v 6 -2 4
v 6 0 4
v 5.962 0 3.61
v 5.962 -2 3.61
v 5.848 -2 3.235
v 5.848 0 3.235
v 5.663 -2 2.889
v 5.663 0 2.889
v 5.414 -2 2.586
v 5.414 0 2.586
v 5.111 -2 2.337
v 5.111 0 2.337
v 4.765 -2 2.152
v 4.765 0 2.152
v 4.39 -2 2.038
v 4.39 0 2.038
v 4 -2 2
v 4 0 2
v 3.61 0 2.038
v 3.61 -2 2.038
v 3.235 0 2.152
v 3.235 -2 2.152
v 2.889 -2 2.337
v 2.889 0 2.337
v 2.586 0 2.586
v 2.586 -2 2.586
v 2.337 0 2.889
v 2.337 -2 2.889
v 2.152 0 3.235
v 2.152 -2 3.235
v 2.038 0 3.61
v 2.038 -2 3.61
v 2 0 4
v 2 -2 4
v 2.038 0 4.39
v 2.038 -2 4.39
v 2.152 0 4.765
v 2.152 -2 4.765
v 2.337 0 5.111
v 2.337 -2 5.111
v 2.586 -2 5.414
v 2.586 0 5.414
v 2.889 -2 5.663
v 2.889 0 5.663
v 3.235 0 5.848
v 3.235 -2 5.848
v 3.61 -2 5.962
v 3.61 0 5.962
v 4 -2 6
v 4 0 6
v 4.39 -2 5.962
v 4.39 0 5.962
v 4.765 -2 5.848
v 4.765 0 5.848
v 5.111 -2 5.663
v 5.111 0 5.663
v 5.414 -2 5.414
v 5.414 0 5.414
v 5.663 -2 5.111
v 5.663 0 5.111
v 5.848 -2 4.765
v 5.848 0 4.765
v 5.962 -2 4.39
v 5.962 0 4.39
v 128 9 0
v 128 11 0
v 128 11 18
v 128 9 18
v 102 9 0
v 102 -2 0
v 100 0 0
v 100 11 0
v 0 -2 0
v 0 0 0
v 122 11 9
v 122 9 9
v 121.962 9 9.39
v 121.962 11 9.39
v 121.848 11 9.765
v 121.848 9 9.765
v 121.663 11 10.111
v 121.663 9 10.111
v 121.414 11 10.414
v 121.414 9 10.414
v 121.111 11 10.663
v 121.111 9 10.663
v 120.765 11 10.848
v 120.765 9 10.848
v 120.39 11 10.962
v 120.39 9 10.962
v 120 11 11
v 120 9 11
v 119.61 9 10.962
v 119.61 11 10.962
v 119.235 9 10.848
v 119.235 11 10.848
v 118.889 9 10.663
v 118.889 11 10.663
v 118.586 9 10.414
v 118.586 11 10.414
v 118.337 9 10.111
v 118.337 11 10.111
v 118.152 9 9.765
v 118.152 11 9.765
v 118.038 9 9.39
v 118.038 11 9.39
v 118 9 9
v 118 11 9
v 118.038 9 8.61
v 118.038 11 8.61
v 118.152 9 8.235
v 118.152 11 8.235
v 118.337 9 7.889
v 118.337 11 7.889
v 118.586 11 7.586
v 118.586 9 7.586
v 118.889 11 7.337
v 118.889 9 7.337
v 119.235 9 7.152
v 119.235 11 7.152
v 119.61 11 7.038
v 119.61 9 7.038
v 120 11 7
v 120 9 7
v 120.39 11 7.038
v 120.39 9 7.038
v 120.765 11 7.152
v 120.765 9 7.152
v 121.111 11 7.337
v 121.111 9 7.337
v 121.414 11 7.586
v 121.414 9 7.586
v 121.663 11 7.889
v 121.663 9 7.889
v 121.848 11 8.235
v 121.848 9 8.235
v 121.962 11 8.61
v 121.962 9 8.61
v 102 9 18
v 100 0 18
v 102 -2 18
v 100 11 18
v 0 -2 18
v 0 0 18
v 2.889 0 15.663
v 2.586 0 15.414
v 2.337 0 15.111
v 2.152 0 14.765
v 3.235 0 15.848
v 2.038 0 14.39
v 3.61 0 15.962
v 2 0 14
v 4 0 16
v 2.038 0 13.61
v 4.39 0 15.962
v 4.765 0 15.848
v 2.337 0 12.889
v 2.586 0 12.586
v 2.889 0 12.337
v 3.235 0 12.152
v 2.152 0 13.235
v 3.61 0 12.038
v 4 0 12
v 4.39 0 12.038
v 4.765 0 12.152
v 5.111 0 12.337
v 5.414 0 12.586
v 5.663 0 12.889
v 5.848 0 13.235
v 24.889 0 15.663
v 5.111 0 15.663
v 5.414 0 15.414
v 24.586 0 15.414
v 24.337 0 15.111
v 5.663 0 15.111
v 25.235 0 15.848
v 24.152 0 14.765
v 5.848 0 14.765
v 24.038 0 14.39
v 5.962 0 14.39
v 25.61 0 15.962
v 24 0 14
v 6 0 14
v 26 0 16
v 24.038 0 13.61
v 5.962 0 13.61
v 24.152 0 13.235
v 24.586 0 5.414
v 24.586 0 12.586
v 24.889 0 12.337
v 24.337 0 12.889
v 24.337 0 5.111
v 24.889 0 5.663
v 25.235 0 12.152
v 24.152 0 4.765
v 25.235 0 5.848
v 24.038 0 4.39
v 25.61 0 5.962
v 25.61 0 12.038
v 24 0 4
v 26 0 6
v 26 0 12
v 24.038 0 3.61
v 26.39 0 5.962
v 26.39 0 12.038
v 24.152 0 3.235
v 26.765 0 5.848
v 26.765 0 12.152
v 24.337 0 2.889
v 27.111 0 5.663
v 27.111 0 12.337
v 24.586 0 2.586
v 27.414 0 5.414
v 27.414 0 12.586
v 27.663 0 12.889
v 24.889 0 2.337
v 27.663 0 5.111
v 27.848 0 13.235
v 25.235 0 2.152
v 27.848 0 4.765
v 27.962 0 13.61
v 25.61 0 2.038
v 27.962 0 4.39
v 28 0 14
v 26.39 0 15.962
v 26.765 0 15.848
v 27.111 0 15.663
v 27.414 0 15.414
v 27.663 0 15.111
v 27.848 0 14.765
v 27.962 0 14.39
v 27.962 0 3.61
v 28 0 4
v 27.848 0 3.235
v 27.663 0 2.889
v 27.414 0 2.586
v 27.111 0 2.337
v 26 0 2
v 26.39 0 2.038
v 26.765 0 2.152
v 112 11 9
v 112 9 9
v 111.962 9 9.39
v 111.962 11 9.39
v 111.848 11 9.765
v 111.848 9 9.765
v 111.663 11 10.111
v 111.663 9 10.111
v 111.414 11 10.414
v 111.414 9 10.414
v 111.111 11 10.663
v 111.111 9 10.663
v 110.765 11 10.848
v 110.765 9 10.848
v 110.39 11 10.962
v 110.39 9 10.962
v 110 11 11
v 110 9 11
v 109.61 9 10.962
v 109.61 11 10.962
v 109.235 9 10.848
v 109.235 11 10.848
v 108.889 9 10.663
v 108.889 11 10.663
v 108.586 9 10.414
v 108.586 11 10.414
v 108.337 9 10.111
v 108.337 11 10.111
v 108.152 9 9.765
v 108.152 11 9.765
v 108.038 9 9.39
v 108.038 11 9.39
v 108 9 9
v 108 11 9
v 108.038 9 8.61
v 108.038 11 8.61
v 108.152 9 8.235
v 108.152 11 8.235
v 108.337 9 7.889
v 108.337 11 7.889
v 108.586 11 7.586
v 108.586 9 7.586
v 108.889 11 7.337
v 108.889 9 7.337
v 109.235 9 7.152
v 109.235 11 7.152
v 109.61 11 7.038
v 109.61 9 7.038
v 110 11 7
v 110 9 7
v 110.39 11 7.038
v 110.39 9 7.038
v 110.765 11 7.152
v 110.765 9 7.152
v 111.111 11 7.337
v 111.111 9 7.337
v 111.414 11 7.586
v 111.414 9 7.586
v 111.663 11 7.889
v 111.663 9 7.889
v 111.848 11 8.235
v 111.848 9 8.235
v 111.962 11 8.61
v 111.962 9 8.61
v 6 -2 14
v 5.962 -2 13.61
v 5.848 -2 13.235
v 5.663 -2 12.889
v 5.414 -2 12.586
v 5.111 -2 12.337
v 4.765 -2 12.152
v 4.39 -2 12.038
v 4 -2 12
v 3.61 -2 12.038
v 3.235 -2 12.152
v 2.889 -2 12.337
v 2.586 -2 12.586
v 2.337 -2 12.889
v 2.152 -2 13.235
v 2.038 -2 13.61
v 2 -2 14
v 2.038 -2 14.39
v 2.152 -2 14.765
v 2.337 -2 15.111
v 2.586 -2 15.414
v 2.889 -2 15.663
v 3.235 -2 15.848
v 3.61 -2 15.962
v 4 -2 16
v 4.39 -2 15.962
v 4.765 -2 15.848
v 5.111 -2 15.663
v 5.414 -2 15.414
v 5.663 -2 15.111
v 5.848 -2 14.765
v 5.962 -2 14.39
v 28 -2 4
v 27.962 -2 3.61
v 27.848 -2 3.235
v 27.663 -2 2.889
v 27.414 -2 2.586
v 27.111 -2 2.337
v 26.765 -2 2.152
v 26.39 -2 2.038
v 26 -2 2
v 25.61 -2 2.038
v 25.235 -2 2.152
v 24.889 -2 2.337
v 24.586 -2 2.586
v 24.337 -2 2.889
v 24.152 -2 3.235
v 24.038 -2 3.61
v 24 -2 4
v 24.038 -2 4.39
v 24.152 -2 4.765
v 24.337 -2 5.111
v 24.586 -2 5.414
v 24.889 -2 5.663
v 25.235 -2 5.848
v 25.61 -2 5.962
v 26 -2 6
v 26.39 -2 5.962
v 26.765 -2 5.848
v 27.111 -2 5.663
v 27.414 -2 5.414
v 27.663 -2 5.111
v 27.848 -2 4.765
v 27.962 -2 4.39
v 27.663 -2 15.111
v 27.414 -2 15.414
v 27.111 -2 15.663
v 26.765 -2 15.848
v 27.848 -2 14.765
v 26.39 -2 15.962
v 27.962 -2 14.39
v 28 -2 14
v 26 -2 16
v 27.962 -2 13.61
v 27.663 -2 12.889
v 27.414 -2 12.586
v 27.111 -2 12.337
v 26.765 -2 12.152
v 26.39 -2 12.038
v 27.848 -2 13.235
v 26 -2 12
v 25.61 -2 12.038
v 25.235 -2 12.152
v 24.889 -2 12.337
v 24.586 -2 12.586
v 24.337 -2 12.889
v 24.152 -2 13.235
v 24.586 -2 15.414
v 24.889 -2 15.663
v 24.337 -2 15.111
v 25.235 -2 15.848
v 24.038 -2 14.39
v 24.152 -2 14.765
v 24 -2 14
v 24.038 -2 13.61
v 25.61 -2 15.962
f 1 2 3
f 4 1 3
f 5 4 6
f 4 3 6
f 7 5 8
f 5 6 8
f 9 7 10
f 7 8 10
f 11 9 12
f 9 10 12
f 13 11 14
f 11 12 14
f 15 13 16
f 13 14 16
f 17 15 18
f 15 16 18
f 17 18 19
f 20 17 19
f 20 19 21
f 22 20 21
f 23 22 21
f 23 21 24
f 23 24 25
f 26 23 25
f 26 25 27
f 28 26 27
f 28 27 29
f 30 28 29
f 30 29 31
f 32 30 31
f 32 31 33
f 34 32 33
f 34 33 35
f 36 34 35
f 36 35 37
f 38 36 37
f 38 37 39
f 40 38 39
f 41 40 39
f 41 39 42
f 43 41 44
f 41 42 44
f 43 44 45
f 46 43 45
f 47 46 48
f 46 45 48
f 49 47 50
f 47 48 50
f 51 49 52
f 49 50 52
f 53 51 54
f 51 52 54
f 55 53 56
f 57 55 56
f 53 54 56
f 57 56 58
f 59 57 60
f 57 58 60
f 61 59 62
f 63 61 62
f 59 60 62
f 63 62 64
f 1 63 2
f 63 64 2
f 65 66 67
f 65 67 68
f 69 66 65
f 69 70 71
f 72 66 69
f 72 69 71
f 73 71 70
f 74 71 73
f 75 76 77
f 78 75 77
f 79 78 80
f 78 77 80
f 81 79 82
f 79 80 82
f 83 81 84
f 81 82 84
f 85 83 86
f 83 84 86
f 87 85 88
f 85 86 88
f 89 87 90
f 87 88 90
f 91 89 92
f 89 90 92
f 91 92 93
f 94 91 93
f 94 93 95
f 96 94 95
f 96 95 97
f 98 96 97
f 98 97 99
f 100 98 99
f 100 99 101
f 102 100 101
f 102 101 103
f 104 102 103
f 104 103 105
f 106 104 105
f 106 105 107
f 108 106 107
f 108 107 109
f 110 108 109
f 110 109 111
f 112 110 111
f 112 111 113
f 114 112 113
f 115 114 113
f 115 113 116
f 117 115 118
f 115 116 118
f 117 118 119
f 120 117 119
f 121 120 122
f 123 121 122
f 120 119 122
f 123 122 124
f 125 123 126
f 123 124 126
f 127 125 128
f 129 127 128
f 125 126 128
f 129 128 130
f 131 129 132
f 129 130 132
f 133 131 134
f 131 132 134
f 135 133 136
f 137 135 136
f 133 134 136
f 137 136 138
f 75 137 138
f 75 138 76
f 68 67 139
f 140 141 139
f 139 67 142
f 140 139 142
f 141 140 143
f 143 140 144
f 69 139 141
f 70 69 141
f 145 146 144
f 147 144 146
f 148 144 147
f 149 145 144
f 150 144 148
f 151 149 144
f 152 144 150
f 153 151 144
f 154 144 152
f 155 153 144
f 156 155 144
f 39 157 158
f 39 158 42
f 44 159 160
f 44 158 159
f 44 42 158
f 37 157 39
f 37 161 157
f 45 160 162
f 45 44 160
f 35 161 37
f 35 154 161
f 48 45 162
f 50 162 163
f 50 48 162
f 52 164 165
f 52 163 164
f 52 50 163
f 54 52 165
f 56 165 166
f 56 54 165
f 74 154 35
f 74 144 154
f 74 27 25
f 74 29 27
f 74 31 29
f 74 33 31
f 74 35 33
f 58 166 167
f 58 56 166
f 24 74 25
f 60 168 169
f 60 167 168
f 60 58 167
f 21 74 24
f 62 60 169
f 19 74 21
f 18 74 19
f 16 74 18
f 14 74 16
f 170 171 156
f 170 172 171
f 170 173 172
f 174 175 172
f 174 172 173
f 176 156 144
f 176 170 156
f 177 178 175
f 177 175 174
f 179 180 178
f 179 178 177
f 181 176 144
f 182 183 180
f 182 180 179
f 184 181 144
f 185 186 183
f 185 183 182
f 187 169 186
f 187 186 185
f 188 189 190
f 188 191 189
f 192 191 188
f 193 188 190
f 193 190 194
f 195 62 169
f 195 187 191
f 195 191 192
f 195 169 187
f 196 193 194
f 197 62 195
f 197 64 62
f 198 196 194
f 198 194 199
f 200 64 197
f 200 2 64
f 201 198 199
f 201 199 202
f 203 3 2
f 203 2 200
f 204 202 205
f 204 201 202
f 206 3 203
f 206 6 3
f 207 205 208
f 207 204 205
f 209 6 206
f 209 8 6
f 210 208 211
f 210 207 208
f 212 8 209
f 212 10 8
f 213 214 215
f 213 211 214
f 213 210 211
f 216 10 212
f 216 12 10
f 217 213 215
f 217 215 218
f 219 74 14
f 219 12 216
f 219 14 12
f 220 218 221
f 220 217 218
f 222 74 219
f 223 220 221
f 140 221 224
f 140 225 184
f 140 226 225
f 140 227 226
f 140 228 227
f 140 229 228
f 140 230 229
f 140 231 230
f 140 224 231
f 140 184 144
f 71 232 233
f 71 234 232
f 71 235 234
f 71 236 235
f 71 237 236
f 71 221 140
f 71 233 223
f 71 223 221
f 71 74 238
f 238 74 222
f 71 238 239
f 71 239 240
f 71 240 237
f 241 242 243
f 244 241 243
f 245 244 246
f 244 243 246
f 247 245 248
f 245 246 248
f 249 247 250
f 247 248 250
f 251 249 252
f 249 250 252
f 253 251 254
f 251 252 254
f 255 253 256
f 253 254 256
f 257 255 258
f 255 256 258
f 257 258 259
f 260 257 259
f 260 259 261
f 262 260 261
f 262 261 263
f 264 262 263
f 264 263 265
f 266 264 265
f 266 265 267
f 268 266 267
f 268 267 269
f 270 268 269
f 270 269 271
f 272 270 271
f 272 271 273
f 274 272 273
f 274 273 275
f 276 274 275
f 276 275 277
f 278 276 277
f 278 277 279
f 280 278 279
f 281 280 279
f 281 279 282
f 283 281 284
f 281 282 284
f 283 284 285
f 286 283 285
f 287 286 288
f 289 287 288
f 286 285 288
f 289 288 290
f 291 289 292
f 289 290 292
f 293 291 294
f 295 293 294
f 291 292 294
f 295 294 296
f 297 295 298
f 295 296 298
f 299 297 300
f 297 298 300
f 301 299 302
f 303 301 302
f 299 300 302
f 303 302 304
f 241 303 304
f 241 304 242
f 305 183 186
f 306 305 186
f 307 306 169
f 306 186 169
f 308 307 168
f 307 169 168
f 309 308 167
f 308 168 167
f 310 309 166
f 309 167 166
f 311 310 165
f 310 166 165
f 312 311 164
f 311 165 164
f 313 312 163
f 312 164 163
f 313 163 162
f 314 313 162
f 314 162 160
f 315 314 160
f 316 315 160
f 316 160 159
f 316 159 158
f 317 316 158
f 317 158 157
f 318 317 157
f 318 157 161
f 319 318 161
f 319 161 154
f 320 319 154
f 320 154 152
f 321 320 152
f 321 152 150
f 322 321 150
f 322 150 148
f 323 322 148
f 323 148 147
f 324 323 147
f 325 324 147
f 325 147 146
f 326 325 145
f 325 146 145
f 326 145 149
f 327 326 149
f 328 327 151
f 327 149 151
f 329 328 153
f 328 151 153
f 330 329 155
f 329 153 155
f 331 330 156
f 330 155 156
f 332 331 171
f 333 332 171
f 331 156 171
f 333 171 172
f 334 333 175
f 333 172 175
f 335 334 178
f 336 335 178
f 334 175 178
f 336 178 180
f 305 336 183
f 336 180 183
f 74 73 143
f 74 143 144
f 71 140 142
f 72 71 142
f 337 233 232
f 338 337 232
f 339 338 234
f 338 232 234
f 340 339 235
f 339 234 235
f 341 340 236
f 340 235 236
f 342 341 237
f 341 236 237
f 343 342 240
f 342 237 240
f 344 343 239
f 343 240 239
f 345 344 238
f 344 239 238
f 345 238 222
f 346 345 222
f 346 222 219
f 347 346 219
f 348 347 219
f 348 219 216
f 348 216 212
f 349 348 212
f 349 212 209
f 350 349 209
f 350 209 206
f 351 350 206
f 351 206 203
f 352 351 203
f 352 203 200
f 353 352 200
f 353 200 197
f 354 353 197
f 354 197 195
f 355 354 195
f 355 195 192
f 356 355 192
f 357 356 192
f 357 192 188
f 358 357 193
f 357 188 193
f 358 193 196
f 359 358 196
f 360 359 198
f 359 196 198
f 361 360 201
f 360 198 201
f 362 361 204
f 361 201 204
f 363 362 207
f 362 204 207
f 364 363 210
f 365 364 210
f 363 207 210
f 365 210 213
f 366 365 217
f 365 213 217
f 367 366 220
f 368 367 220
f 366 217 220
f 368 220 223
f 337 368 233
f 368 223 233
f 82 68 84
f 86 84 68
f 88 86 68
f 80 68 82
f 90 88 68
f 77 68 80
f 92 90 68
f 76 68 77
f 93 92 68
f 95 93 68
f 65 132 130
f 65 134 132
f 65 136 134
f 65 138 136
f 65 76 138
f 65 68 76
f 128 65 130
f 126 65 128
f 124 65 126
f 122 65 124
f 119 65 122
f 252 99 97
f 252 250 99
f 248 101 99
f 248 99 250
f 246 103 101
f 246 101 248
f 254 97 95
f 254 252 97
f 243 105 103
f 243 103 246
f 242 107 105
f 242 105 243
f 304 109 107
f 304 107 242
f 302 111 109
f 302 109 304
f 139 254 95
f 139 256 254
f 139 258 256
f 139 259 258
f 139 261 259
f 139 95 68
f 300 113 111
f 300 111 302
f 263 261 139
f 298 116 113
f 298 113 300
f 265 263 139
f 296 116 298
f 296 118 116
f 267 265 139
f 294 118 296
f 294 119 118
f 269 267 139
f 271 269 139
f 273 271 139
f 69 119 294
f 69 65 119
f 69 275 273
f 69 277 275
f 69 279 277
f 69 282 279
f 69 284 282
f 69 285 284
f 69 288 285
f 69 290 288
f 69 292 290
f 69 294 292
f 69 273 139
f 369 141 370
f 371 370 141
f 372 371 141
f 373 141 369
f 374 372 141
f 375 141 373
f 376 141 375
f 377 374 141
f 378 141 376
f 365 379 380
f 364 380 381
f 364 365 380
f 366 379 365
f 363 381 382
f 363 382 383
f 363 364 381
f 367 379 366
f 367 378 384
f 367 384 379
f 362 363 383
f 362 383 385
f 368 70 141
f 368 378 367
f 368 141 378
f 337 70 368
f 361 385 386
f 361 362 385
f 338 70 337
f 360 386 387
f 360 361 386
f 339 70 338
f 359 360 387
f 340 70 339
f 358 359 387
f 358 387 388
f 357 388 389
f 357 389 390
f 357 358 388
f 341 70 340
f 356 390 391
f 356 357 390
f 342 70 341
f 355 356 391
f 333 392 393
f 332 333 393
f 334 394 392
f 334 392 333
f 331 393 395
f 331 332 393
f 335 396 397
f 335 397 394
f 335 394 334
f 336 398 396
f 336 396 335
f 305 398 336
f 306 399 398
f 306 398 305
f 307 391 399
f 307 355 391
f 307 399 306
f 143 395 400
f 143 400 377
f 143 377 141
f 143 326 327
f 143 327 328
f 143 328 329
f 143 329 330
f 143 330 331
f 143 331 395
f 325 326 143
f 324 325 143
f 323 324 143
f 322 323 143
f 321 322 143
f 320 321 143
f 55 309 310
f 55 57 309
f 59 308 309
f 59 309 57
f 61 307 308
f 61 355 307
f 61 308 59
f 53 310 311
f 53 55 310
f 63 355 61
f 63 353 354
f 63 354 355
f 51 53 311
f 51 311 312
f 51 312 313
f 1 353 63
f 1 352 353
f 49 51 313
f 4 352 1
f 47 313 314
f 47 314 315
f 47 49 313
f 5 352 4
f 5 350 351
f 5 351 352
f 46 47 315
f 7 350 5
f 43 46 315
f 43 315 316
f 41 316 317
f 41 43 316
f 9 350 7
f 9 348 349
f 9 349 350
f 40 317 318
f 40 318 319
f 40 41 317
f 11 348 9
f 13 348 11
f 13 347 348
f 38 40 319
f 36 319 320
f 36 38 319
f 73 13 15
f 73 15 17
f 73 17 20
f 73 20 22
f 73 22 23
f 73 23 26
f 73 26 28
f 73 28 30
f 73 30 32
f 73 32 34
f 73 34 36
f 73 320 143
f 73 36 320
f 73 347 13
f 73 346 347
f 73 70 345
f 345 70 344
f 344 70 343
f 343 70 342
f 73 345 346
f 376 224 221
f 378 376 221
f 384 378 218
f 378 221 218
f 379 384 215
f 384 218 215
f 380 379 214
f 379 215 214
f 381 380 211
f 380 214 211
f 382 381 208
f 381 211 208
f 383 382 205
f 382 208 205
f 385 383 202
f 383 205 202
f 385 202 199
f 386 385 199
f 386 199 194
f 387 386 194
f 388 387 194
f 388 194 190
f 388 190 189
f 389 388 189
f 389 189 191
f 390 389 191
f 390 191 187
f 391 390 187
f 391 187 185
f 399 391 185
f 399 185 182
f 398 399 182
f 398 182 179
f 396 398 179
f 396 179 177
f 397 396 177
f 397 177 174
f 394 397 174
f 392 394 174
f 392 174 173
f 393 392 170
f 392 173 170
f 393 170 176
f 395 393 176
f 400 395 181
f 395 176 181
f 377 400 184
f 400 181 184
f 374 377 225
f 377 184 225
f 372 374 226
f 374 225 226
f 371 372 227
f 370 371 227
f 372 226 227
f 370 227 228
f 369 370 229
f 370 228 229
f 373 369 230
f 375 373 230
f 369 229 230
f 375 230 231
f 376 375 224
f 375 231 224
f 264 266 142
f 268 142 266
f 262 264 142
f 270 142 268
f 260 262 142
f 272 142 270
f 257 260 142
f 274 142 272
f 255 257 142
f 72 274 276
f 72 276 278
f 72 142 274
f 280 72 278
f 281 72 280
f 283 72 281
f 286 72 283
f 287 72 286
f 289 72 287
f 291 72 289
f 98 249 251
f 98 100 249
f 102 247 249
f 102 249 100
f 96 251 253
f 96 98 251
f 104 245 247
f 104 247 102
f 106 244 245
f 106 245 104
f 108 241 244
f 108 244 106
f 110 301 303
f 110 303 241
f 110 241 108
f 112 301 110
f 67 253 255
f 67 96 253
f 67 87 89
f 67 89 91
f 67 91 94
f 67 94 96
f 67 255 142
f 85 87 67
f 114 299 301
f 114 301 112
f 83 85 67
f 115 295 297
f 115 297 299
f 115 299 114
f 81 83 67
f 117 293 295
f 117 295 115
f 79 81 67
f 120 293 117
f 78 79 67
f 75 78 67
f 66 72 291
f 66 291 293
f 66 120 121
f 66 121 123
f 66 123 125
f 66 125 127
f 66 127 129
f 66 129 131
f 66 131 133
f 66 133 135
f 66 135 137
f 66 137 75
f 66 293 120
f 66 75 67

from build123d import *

# Parameters (mm, degrees)
BOSS_EXTRUDE1_DEPTH = 18
CUT_EXTRUDE1_REACH  = 4
SKETCH2_R           = 2
CUT_EXTRUDE2_REACH  = 4
SKETCH3_R           = 2


with BuildPart() as part:
    # Sketch1 → Boss-Extrude1 (new body)
    with BuildSketch(Plane.XY):
        Polygon((0, 0), (100, 0), (100, 11), (128, 11), (128, 9), (102, 9), (102, -2), (0, -2), align=None)
    extrude(amount=BOSS_EXTRUDE1_DEPTH)

    # Sketch2 → Cut-Extrude1 (cut, up to next)
    with BuildSketch(Plane(origin=(0, 0, 0), x_dir=(1, 0, 0), z_dir=(0, 1, 0)), mode=Mode.PRIVATE) as cut_extrude1_sk1:
        with Locations((4, -14)):
            Circle(SKETCH2_R)
    cut_extrude1_tool1 = extrude(cut_extrude1_sk1.sketch, amount=-CUT_EXTRUDE1_REACH, mode=Mode.PRIVATE) & part.part
    add(cut_extrude1_tool1.solids().sort_by_distance((4, 0, 14))[0], mode=Mode.SUBTRACT)
    # Sketch2 → Cut-Extrude1 (cut, up to next)
    with BuildSketch(Plane(origin=(0, 0, 0), x_dir=(1, 0, 0), z_dir=(0, 1, 0)), mode=Mode.PRIVATE) as cut_extrude1_sk2:
        with Locations((4, -4)):
            Circle(SKETCH2_R)
    cut_extrude1_tool2 = extrude(cut_extrude1_sk2.sketch, amount=-CUT_EXTRUDE1_REACH, mode=Mode.PRIVATE) & part.part
    add(cut_extrude1_tool2.solids().sort_by_distance((4, 0, 4))[0], mode=Mode.SUBTRACT)
    # Sketch2 → Cut-Extrude1 (cut, up to next)
    with BuildSketch(Plane(origin=(0, 0, 0), x_dir=(1, 0, 0), z_dir=(0, 1, 0)), mode=Mode.PRIVATE) as cut_extrude1_sk3:
        with Locations((26, -14)):
            Circle(SKETCH2_R)
    cut_extrude1_tool3 = extrude(cut_extrude1_sk3.sketch, amount=-CUT_EXTRUDE1_REACH, mode=Mode.PRIVATE) & part.part
    add(cut_extrude1_tool3.solids().sort_by_distance((26, 0, 14))[0], mode=Mode.SUBTRACT)
    # Sketch2 → Cut-Extrude1 (cut, up to next)
    with BuildSketch(Plane(origin=(0, 0, 0), x_dir=(1, 0, 0), z_dir=(0, 1, 0)), mode=Mode.PRIVATE) as cut_extrude1_sk4:
        with Locations((26, -4)):
            Circle(SKETCH2_R)
    cut_extrude1_tool4 = extrude(cut_extrude1_sk4.sketch, amount=-CUT_EXTRUDE1_REACH, mode=Mode.PRIVATE) & part.part
    add(cut_extrude1_tool4.solids().sort_by_distance((26, 0, 4))[0], mode=Mode.SUBTRACT)

    # Sketch3 → Cut-Extrude2 (cut, up to next)
    with BuildSketch(Plane.XZ.offset(-9), mode=Mode.PRIVATE) as cut_extrude2_sk1:
        with Locations((120, 9)):
            Circle(SKETCH3_R)
    cut_extrude2_tool1 = extrude(cut_extrude2_sk1.sketch, amount=-CUT_EXTRUDE2_REACH, mode=Mode.PRIVATE) & part.part
    add(cut_extrude2_tool1.solids().sort_by_distance((120, 9, 9))[0], mode=Mode.SUBTRACT)
    # Sketch3 → Cut-Extrude2 (cut, up to next)
    with BuildSketch(Plane.XZ.offset(-9), mode=Mode.PRIVATE) as cut_extrude2_sk2:
        with Locations((110, 9)):
            Circle(SKETCH3_R)
    cut_extrude2_tool2 = extrude(cut_extrude2_sk2.sketch, amount=-CUT_EXTRUDE2_REACH, mode=Mode.PRIVATE) & part.part
    add(cut_extrude2_tool2.solids().sort_by_distance((110, 9, 9))[0], mode=Mode.SUBTRACT)


solid = part.part
